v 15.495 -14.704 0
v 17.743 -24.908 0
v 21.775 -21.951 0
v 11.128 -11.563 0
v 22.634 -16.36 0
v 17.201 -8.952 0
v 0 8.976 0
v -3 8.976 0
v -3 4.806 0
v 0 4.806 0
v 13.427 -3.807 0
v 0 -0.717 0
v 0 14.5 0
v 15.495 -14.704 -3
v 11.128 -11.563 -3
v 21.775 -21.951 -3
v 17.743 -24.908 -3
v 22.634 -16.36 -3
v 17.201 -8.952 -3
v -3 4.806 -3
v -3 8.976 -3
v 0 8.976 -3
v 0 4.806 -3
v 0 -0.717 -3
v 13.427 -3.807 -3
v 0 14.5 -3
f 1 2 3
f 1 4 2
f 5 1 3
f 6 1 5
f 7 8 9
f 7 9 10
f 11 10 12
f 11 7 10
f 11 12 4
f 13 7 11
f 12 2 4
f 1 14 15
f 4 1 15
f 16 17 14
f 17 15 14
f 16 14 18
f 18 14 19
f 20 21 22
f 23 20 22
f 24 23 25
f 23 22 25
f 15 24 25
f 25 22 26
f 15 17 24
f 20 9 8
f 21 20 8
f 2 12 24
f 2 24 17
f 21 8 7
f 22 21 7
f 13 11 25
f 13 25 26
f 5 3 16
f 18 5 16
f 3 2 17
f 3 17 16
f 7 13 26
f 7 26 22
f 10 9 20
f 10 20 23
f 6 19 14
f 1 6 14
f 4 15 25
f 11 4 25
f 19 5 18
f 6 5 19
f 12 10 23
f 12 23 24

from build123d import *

# Parameters (mm, degrees)
BOSS_EXTRUDE1_DEPTH = 3
SKETCH2_W           = 3
SKETCH2_H           = 4.17
BOSS_EXTRUDE2_DEPTH = 3
CUT_EXTRUDE2_DEPTH  = 3
CHAMFER1_SIZE       = 4


with BuildPart() as part:
    # Sketch1 → Boss-Extrude1 (new body)
    with BuildSketch(Plane.XY):
        Polygon((0, 14.5), (0, -0.717472322), (17.74276268, -24.90826339), (25, -19.585434587), align=None)
    extrude(amount=-BOSS_EXTRUDE1_DEPTH)

    # Sketch2 → Boss-Extrude2 (add)
    with BuildSketch(Plane.XY):
        with Locations((-1.5, 6.891263839)):
            Rectangle(SKETCH2_W, SKETCH2_H)
    extrude(amount=-BOSS_EXTRUDE2_DEPTH)

    # Sketch3 → Cut-Extrude2 (cut)
    with BuildSketch(Plane(origin=(0, 0, -3), x_dir=(-1, 0, 0), z_dir=(0, 0, -1))):
        Polygon((-13.427123713, -3.806773881), (-17.200564762, -8.951549002), (-15.495347423, -14.704133971), (-11.12785759, -11.563394363), align=None)
    extrude(amount=-CUT_EXTRUDE2_DEPTH, mode=Mode.SUBTRACT)

    # Chamfer1
    chamfer1_edges = [part.edges().sort_by_distance(p)[0] for p in [
        (25, -19.585434587, -1.5),
    ]]
    chamfer(chamfer1_edges, length=CHAMFER1_SIZE)


solid = part.part
